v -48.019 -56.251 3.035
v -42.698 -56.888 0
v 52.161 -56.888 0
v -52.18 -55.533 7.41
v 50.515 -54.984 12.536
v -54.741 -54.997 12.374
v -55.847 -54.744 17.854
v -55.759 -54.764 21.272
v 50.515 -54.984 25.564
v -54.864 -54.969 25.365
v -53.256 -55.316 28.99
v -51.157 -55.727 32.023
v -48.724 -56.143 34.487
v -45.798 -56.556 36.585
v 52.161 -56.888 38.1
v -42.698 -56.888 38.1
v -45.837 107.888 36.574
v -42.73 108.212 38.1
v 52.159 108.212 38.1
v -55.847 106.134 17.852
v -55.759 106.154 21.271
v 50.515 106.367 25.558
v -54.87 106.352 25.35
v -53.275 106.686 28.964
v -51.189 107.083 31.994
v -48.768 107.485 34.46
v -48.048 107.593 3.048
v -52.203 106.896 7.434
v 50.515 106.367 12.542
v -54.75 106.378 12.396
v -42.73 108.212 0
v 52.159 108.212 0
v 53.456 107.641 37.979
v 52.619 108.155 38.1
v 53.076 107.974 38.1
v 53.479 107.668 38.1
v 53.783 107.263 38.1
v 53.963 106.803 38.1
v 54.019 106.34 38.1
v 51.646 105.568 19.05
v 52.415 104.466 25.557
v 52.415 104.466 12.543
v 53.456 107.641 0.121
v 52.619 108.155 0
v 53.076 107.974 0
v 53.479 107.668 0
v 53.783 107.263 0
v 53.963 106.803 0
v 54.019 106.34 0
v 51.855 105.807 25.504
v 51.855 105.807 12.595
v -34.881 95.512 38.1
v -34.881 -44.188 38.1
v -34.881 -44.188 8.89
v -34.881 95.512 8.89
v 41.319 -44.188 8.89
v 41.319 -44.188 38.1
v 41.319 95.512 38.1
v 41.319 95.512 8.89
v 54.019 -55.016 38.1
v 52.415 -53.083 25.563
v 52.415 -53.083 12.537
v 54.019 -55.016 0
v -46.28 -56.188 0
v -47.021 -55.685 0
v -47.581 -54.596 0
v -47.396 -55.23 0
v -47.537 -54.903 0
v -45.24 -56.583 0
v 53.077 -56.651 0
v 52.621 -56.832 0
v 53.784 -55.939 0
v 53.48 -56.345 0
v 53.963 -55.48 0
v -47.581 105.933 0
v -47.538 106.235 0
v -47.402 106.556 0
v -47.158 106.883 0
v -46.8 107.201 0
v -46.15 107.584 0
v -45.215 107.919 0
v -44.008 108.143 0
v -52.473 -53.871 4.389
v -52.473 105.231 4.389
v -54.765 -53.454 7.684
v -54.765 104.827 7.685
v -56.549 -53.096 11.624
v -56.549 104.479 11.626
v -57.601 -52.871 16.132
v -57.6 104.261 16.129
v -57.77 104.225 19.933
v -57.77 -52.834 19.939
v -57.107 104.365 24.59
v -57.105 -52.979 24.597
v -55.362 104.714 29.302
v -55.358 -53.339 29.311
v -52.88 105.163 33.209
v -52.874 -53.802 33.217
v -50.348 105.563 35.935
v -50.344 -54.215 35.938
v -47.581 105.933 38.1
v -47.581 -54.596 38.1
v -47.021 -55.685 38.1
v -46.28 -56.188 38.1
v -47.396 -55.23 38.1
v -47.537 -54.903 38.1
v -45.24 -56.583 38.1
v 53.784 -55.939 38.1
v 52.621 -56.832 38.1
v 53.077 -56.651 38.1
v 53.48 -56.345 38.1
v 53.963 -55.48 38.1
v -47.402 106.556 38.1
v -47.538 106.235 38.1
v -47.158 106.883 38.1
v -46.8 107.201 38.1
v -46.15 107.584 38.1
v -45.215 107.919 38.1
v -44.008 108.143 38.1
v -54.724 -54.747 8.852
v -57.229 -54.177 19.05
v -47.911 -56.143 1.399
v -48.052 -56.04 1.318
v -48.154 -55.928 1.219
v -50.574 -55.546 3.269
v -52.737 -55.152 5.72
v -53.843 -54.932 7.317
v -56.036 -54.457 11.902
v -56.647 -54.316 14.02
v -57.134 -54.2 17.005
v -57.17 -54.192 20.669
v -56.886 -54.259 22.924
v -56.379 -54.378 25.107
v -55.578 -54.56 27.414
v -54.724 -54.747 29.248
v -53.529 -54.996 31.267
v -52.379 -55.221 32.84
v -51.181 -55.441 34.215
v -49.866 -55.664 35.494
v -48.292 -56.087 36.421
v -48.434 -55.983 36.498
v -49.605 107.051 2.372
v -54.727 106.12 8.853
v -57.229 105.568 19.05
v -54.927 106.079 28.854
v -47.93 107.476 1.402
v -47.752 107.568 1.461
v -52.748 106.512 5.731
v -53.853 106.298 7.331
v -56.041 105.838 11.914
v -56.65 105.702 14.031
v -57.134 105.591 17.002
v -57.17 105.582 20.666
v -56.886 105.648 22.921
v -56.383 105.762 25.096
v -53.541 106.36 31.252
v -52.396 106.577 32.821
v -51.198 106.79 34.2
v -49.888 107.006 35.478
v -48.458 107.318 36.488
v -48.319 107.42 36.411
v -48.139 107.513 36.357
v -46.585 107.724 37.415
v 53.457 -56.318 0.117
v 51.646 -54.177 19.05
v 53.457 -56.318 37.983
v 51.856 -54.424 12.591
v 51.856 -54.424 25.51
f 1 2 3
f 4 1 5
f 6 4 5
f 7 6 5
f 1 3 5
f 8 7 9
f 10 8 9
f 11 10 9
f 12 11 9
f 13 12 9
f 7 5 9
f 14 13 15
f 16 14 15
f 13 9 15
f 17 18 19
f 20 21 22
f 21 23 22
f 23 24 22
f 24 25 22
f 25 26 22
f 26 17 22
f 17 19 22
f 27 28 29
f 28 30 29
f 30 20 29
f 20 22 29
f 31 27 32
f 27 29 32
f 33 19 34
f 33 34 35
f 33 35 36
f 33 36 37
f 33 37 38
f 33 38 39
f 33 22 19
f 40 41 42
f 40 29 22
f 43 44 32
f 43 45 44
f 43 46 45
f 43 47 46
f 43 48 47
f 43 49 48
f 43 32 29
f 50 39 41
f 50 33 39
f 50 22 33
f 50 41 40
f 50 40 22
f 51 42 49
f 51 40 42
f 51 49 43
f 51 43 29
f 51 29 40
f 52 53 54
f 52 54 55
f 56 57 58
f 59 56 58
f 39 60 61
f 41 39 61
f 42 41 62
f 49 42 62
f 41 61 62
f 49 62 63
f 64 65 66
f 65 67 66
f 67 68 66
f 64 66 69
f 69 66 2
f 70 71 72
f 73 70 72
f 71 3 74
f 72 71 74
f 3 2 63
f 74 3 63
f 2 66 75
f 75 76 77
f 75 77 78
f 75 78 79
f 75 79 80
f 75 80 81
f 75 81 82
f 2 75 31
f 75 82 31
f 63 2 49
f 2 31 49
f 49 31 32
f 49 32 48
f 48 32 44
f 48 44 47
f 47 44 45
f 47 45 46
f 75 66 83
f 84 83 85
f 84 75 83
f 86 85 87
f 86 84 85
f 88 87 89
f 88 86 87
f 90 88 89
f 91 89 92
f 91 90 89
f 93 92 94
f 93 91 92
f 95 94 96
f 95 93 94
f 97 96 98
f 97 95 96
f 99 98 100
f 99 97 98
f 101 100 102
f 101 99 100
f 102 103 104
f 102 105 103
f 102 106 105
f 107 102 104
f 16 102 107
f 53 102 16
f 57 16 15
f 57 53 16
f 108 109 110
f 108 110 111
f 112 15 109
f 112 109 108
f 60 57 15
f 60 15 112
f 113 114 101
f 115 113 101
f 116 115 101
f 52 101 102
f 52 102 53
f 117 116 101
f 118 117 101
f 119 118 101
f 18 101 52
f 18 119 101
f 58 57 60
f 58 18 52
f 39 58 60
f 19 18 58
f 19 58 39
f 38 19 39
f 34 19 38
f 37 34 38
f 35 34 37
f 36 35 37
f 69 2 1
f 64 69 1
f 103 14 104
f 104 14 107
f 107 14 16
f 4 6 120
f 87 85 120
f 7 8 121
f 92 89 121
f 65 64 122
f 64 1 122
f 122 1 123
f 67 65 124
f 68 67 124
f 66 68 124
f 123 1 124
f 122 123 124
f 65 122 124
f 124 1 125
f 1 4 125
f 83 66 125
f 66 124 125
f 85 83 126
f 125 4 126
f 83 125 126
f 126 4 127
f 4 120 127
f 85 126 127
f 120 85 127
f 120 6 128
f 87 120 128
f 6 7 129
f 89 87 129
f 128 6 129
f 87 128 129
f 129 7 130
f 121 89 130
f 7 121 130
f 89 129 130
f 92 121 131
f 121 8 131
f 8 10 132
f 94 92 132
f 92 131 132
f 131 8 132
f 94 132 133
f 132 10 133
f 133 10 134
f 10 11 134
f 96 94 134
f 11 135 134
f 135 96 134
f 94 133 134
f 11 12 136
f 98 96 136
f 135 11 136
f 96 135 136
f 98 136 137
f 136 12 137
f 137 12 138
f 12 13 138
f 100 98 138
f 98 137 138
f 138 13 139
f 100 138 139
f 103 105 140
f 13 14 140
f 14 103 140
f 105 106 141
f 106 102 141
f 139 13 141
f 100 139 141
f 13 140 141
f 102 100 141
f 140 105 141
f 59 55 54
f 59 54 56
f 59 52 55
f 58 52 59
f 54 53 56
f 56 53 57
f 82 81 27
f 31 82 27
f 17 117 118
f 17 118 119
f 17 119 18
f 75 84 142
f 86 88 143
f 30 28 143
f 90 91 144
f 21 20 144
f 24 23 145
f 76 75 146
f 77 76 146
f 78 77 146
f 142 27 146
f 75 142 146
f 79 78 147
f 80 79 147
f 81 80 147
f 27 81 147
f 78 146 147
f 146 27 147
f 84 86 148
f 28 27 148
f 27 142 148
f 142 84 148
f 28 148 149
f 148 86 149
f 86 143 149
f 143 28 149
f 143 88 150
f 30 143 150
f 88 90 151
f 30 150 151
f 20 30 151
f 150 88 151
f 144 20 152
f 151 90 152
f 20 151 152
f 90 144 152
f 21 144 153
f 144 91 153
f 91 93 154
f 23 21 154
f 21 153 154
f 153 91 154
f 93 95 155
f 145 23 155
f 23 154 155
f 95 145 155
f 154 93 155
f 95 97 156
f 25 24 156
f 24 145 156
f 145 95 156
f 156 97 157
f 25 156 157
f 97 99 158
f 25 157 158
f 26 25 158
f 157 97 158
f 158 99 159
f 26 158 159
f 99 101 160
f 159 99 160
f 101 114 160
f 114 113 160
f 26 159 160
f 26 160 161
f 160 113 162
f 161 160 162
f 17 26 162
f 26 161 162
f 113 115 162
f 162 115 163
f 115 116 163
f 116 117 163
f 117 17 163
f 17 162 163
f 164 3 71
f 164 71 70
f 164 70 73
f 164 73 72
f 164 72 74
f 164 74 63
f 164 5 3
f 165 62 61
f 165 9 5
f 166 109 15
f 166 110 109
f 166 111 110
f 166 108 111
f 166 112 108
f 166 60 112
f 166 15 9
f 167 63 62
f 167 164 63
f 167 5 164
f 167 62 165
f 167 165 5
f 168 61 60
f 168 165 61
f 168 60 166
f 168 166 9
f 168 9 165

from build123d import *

# Parameters (mm, degrees)
F0_W     = 101.6
F0_H     = 165.1
F1_DEPTH = 38.1
F2_W     = 76.2
F2_H     = 139.7
F3_DEPTH = 29.21
F5_DEPTH = 165.1
F8_DEPTH = 177.8
F9_DEPTH = 203.2
F10_R    = 1.905
F11_R    = 1.905


with BuildPart() as f1:
    # F0 (on Top) → F1 (new body)
    with BuildSketch(Plane.XY):
        with Locations((3.219465, 25.661658)):
            Rectangle(F0_W, F0_H)
    extrude(amount=F1_DEPTH)

    # F2 (on face) → F3 (cut)
    with BuildSketch(Plane.XY.offset(38.1)):
        with Locations((3.219465, 25.661658)):
            Rectangle(F2_W, F2_H)
    extrude(amount=-F3_DEPTH, mode=Mode.SUBTRACT)

    # F4 (on face) → F5 (join)
    with BuildSketch(Plane(origin=(0, 108.211658, 0), x_dir=(-1, 0, 0), z_dir=(0, 1, 0))):
        with BuildLine():
            Line((47.580535, 38.1), (47.580535, 0))
            ThreePointArc((47.580535, 0), (57.787384, 19.05), (47.580535, 38.1))
        make_face()
    extrude(amount=-F5_DEPTH)

    # F7 (on face) → F8 (cut)
    with BuildSketch(Plane.YZ.offset(54.019465)):
        with BuildLine():
            ThreePointArc((108.211658, 38.1), (106.126335, 19.05), (108.211658, 0))
            Line((108.211658, 0), (108.211658, 38.1))
        make_face()
        with BuildLine():
            Line((-56.888342, 38.1), (-56.888342, 0))
            ThreePointArc((-56.888342, 0), (-54.735258, 19.05), (-56.888342, 38.1))
        make_face()
    extrude(amount=-F8_DEPTH, mode=Mode.SUBTRACT)

    # F6 (on face) → F9 (cut)
    with BuildSketch(Plane.XZ.offset(56.888342)):
        with BuildLine():
            Line((54.019465, 0), (54.019465, 38.1))
            ThreePointArc((54.019465, 38.1), (52.204457, 19.05), (54.019465, 0))
        make_face()
    extrude(amount=-F9_DEPTH, mode=Mode.SUBTRACT)

    # F10
    f10_edges = [f1.edges().sort_by_distance(p)[0] for p in [
        (52.204457, -54.735258, 19.05),
        (52.204457, 106.126335, 19.05),
    ]]
    fillet(f10_edges, radius=F10_R)

    # F11
    f11_edges = [f1.edges().sort_by_distance(p)[0] for p in [
        (-57.787384, -54.735258, 19.05),
        (-57.787384, 106.126335, 19.05),
    ]]
    fillet(f11_edges, radius=F11_R)


solid = f1.part
